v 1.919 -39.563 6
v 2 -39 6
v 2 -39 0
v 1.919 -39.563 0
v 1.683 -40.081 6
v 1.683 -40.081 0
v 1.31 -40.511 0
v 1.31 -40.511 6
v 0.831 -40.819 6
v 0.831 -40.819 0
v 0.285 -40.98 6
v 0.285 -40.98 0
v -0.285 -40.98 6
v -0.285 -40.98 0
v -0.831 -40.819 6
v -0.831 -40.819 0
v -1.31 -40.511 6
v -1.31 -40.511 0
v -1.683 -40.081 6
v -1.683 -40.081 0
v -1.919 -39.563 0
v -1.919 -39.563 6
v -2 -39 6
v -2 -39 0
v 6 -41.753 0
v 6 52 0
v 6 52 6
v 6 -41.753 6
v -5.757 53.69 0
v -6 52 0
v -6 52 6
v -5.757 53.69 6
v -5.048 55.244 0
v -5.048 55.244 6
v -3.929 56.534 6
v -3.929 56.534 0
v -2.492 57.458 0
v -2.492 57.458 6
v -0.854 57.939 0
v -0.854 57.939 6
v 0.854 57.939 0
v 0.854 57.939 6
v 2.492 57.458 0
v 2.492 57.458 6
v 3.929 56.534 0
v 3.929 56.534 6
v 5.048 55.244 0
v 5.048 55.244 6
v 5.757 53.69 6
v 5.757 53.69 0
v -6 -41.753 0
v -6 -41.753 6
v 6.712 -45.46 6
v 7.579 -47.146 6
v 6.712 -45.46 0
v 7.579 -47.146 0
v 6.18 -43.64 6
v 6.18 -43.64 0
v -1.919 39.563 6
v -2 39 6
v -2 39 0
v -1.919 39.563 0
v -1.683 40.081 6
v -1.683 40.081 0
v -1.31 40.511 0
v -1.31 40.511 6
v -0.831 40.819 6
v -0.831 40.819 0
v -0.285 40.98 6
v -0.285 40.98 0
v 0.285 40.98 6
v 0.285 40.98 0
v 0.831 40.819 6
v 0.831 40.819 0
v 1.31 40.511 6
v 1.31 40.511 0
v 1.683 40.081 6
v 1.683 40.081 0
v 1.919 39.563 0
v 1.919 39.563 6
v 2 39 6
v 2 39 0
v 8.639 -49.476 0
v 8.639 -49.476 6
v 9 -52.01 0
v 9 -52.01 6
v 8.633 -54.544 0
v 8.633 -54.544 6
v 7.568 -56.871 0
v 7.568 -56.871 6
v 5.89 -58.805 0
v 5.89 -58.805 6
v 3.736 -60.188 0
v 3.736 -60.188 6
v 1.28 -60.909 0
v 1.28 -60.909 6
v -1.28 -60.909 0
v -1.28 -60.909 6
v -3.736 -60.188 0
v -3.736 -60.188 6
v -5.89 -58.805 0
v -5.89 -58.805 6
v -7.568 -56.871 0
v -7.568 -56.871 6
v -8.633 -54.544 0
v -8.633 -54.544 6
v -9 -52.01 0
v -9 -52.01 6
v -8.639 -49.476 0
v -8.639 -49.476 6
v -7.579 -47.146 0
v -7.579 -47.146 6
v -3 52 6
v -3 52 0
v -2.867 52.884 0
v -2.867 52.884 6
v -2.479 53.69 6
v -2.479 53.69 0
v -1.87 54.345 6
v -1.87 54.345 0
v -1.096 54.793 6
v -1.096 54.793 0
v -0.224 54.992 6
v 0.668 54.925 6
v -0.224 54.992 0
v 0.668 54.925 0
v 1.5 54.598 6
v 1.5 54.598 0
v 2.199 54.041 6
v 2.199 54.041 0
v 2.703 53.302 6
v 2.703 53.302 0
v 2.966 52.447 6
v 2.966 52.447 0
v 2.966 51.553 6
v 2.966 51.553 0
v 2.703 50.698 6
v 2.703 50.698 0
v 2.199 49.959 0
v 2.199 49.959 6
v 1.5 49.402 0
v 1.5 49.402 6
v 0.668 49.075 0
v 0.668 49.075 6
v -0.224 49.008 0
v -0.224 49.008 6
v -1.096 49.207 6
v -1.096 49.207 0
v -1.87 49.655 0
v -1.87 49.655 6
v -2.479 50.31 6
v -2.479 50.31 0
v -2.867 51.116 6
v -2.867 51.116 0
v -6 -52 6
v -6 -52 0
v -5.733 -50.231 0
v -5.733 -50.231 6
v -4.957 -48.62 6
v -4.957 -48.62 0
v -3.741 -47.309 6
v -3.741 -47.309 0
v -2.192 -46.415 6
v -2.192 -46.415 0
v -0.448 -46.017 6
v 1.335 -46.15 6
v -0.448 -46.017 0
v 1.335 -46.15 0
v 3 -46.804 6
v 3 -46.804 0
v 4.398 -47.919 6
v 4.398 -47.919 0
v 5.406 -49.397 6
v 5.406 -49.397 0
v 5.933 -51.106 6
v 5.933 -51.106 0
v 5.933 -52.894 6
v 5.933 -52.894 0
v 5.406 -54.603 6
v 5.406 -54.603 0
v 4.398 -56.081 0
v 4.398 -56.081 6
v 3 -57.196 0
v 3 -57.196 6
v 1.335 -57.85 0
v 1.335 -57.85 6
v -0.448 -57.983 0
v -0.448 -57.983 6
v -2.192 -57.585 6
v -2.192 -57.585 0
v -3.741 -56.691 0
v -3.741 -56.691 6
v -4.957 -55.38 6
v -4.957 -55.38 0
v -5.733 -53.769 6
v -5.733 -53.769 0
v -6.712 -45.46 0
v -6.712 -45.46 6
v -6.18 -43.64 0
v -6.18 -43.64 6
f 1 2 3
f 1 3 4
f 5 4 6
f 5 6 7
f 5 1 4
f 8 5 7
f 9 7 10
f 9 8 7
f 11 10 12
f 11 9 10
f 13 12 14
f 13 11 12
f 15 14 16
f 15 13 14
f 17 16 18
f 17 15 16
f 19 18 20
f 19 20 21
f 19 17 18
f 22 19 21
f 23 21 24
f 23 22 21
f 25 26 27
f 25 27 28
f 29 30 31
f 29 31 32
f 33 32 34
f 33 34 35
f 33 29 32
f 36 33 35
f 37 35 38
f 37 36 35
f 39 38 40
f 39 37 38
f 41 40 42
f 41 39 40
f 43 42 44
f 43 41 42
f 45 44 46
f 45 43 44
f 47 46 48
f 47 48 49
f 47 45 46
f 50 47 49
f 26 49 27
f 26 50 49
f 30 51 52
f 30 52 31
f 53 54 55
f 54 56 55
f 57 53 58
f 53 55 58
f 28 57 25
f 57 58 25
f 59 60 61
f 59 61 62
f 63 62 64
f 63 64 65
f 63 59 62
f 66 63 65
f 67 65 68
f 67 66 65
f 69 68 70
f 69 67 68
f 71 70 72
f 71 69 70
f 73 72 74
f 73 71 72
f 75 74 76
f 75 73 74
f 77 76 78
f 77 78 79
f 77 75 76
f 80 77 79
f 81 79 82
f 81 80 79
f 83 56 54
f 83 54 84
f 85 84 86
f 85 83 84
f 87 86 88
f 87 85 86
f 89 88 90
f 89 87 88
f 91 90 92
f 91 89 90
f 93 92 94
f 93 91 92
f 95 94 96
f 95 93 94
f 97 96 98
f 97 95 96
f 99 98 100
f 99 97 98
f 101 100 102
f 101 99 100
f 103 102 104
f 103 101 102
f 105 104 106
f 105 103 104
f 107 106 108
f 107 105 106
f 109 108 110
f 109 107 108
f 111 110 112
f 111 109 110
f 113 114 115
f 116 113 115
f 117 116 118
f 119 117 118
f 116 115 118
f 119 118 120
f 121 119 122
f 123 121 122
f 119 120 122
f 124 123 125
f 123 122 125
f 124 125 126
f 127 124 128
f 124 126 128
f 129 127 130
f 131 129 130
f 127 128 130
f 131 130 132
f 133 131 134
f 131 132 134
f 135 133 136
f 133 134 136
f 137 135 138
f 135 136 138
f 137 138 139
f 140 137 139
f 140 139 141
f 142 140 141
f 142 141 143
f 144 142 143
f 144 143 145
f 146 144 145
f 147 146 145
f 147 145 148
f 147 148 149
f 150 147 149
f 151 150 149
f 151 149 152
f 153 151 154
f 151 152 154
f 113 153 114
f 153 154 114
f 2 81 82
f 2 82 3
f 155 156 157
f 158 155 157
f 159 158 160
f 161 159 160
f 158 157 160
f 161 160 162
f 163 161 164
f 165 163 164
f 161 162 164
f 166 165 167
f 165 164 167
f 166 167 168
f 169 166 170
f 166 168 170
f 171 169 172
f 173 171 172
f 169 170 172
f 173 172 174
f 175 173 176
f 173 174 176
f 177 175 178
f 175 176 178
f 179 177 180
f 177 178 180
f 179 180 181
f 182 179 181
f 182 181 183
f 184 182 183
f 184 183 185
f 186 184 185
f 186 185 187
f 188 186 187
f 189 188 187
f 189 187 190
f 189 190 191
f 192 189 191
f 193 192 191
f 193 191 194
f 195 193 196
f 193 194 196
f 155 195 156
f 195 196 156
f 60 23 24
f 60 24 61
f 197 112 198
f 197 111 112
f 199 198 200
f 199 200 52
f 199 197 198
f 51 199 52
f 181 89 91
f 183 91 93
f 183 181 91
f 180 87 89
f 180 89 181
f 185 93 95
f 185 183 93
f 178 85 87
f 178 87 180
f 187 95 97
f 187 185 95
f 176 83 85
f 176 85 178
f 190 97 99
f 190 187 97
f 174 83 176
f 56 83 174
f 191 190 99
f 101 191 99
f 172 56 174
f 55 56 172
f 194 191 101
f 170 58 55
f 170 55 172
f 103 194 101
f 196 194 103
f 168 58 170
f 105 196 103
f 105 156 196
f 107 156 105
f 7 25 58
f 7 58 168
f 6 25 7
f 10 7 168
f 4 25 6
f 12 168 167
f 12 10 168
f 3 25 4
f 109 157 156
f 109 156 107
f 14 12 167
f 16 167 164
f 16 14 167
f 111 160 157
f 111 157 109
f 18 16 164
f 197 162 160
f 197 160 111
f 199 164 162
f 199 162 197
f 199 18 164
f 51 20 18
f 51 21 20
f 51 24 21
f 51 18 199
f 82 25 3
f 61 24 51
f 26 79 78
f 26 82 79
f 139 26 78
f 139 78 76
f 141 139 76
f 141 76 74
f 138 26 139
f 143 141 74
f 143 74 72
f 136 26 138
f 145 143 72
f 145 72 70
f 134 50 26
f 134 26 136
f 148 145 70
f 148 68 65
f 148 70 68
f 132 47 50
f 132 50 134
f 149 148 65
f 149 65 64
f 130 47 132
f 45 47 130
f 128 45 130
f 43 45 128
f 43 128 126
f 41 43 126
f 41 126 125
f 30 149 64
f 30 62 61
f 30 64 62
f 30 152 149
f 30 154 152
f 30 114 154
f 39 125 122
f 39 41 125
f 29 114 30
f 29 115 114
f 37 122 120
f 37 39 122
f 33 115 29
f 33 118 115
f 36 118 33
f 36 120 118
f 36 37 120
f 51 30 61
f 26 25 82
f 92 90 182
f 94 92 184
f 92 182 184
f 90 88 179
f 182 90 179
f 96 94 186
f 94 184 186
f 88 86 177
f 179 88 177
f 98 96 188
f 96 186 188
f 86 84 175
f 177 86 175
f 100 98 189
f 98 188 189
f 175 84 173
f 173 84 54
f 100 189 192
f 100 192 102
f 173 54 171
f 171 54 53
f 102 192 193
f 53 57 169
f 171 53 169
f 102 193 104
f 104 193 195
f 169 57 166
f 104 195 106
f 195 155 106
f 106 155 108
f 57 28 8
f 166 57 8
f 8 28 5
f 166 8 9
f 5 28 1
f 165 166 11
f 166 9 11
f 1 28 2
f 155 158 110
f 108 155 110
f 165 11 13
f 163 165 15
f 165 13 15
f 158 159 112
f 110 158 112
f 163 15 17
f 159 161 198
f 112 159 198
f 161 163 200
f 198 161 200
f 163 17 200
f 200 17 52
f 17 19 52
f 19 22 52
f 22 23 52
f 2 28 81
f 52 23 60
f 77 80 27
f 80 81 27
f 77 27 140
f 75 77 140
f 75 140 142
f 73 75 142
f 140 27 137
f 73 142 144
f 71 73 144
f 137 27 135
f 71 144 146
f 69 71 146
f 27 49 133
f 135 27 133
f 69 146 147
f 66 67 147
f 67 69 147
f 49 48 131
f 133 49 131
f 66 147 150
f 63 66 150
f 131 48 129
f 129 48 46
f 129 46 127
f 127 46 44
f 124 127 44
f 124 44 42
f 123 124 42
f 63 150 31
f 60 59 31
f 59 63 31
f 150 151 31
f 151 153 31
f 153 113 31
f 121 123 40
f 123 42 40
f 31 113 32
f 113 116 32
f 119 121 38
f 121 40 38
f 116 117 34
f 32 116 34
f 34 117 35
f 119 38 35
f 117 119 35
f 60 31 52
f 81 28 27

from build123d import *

# Parameters (mm, degrees)
EXTRUDE_1_DEPTH     = 6
SKETCH_2_R          = 9
EXTRUDE_2_DEPTH     = 6
SKETCH_3_R          = 6
SKETCH_3_R_2        = 3
CUT_EXTRUDE_1_DEPTH = 6
FILLET_1_R          = 10
CUT_EXTRUDE_2_DEPTH = 6


with BuildPart() as part:
    # 草图1 → 凸台-拉伸1 (new body)
    with BuildSketch(Plane.XY):
        with BuildLine():
            Line((-6, -52), (-6, 52))
            ThreePointArc((-6, 52), (0, 58), (6, 52))
            Line((6, 52), (6, -52))
            ThreePointArc((6, -52), (0, -58), (-6, -52))
        make_face()
    extrude(amount=EXTRUDE_1_DEPTH)

    # 草图2 → 凸台-拉伸2 (add)
    with BuildSketch(Plane(origin=(0, 0, 0), x_dir=(-1, 0, 0), z_dir=(0, 0, -1))):
        with Locations((0, -52)):
            Circle(SKETCH_2_R)
    extrude(amount=-EXTRUDE_2_DEPTH)

    # 草图3 → 切除-拉伸1 (cut)
    with BuildSketch(Plane(origin=(0, 0, 0), x_dir=(-1, 0, 0), z_dir=(0, 0, -1))):
        with Locations((0, -52)):
            Circle(SKETCH_3_R)
        with Locations((0, 52)):
            Circle(SKETCH_3_R_2)
    extrude(amount=-CUT_EXTRUDE_1_DEPTH, mode=Mode.SUBTRACT)

    # 圆角1
    fillet_1_edges = [part.edges().sort_by_distance(p)[0] for p in [
        (6, -45.291796068, 3),
        (-6, -45.291796068, 3),
    ]]
    fillet(fillet_1_edges, radius=FILLET_1_R)

    # 草图4 → 切除-拉伸2 (cut)
    with BuildSketch(Plane.XY.offset(6)):
        with BuildLine():
            Line((-2, -39), (-2, 39))
            ThreePointArc((-2, 39), (0, 41), (2, 39))
            Line((2, 39), (2, -39))
            ThreePointArc((2, -39), (0, -41), (-2, -39))
        make_face()
    extrude(amount=-CUT_EXTRUDE_2_DEPTH, mode=Mode.SUBTRACT)


solid = part.part
